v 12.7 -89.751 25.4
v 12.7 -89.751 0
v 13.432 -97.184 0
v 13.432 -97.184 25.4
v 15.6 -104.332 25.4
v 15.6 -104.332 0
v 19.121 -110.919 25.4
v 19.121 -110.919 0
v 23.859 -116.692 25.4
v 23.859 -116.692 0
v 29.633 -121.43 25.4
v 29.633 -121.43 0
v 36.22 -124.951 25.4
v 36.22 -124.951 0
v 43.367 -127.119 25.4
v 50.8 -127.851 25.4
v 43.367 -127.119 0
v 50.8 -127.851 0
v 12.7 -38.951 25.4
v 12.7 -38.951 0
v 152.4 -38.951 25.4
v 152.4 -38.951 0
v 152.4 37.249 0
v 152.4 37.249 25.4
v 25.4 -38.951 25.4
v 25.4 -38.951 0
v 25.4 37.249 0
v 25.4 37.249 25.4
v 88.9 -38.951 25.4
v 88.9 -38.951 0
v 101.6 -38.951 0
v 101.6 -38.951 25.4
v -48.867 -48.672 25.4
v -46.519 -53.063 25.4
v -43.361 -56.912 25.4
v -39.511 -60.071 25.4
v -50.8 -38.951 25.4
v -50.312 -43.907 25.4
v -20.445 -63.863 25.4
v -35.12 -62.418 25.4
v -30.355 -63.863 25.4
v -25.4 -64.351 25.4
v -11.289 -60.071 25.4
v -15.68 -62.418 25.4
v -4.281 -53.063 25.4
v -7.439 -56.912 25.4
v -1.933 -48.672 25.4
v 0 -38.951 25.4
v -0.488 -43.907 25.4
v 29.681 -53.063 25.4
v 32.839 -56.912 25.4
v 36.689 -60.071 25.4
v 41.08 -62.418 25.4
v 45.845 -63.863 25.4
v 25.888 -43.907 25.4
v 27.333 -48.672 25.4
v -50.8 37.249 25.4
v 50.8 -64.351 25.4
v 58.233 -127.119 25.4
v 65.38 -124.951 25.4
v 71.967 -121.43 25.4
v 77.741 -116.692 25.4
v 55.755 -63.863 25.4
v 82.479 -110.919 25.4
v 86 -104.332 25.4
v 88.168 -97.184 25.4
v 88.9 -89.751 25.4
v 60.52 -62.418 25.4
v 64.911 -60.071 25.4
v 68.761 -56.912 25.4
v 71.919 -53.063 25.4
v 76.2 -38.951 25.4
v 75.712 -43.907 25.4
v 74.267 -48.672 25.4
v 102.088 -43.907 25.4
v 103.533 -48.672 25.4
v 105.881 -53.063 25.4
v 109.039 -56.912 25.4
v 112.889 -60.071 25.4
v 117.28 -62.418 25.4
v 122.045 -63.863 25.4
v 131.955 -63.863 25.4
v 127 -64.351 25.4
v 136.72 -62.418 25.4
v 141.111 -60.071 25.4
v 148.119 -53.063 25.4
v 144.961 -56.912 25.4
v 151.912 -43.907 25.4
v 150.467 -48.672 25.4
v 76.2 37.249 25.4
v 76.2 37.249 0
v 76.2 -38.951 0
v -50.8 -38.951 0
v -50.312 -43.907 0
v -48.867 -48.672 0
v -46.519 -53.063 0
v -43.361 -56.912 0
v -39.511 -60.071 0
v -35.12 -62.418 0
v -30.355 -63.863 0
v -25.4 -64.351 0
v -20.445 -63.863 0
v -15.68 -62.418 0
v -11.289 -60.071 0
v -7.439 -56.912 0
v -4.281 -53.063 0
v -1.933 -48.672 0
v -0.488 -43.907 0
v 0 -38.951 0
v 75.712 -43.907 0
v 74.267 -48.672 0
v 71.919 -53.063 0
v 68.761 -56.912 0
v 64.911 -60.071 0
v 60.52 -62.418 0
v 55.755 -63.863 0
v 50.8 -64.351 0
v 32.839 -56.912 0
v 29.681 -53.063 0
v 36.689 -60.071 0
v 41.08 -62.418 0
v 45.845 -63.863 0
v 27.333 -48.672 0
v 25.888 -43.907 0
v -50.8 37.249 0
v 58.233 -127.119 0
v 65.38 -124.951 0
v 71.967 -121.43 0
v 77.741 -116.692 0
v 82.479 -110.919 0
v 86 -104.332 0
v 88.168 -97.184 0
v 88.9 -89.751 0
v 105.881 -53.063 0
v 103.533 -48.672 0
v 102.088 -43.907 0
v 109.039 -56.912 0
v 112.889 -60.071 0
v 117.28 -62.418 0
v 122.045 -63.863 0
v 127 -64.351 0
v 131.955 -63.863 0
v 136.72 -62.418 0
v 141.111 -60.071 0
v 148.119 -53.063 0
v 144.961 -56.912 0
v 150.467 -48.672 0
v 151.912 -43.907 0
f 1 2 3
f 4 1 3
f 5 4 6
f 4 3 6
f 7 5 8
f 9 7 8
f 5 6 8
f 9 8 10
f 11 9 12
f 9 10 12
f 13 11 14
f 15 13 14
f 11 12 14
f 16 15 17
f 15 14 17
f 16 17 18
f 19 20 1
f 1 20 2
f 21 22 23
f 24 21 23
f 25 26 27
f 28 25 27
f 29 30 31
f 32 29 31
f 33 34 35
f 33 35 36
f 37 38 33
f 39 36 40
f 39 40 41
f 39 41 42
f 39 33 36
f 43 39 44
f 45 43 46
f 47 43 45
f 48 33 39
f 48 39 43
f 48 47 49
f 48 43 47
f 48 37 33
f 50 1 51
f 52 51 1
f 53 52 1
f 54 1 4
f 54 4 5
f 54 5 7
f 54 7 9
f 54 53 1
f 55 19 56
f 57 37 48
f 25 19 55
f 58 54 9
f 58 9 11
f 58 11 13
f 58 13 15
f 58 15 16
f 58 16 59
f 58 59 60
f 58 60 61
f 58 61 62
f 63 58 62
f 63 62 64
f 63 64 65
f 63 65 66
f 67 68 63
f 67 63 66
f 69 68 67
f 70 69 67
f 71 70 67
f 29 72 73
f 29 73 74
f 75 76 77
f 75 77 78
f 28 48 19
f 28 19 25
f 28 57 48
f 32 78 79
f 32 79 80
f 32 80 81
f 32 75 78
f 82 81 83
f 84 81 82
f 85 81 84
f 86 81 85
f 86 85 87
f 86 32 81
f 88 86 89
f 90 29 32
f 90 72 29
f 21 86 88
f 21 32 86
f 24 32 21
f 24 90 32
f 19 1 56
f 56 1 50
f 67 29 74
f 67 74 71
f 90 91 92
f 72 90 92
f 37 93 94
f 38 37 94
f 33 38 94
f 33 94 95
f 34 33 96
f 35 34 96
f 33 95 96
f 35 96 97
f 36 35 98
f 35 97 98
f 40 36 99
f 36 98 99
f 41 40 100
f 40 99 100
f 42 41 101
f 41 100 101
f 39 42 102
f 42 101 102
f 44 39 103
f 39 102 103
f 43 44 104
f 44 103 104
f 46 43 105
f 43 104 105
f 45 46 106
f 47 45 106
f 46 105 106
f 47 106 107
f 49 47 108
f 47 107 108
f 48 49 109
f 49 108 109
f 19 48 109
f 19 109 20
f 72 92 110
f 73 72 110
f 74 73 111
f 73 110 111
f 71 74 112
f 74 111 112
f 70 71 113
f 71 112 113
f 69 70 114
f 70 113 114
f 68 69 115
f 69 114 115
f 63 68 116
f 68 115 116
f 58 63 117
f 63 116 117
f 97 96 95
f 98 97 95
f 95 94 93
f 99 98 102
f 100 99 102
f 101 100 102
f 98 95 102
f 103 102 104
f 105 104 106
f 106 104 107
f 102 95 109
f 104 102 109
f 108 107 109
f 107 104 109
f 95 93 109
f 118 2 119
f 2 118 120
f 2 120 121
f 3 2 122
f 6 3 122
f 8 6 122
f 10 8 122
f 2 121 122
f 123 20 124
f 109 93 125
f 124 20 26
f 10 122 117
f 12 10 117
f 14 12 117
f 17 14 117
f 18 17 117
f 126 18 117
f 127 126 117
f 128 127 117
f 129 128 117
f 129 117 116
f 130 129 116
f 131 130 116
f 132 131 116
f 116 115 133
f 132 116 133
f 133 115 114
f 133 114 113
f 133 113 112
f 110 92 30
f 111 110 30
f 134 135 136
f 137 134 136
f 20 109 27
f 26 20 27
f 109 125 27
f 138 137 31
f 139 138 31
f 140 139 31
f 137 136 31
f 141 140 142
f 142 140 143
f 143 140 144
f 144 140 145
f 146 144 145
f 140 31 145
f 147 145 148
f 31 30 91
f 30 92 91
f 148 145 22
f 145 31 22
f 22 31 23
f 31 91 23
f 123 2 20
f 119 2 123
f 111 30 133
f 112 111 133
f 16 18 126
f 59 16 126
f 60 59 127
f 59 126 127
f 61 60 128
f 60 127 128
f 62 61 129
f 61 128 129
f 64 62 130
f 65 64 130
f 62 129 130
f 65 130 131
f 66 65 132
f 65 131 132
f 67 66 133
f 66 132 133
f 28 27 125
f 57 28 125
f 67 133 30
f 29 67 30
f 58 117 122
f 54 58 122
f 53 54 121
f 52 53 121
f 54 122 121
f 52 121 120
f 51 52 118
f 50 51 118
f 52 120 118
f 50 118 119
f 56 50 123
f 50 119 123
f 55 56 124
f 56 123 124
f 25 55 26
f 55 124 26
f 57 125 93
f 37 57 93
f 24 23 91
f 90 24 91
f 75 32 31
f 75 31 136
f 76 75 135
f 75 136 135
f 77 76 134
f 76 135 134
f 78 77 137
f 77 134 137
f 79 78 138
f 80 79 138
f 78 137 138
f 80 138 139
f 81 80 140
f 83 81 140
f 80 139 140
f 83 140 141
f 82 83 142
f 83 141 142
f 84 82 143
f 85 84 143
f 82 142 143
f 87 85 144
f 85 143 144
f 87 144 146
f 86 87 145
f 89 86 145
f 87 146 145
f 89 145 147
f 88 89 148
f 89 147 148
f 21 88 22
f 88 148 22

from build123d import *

# Parameters (mm, degrees)
F1_DEPTH = 25.4


with BuildPart() as f1:
    # F0 (on Top) → F1 (new body)
    with BuildSketch(Plane.XY):
        with BuildLine():
            Line((25.4, 37.248519), (-50.8, 37.248519))
            Line((-50.8, 37.248519), (-50.8, -38.951481))
            ThreePointArc((-50.8, -38.951481), (-25.4, -64.351481), (0, -38.951481))
            Line((0, -38.951481), (12.7, -38.951481))
            Line((12.7, -38.951481), (12.7, -89.751481))
            ThreePointArc((12.7, -89.751481), (23.859232, -116.692249), (50.8, -127.851481))
            ThreePointArc((50.8, -127.851481), (77.740768, -116.692249), (88.9, -89.751481))
            Line((88.9, -89.751481), (88.9, -38.951481))
            Line((88.9, -38.951481), (101.6, -38.951481))
            ThreePointArc((101.6, -38.951481), (127, -64.351481), (152.4, -38.951481))
            Line((152.4, -38.951481), (152.4, 37.248519))
            Line((152.4, 37.248519), (76.2, 37.248519))
            Line((76.2, 37.248519), (76.2, -38.951481))
            ThreePointArc((76.2, -38.951481), (68.760512, -56.911993), (50.8, -64.351481))
            ThreePointArc((50.8, -64.351481), (32.839488, -56.911993), (25.4, -38.951481))
            Line((25.4, -38.951481), (25.4, 37.248519))
        make_face()
    extrude(amount=F1_DEPTH)


solid = f1.part
